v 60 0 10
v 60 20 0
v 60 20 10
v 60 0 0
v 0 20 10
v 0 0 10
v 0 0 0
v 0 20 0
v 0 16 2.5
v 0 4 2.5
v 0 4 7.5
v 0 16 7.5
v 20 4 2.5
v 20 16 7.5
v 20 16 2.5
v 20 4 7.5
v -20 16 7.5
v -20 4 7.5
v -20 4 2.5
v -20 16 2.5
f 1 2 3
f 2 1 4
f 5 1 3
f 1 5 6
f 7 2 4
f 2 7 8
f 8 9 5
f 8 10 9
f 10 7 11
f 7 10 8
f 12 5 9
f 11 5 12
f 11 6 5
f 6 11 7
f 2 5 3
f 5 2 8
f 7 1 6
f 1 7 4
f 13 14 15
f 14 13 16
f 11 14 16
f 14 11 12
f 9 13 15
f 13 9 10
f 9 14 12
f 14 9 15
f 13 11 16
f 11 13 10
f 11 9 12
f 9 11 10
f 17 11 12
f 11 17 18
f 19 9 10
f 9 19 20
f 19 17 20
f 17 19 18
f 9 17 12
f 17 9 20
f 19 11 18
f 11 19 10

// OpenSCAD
// Parameters for the USB Disk
length = 60; // Length of the USB Disk
width = 20;  // Width of the USB Disk
height = 10; // Height of the USB Disk

// Parameters for the USB Connector
conn_length = 20; // Length of the Connector
conn_width = 12;  // Width of the Connector
conn_height = 5;  // Height of the Connector

module usb_disk() {
    difference() {
        // Body of the USB Disk
        cube([length, width, height]);

        // Hollow space for the USB Connector
        translate([0, (width - conn_width)/2, (height - conn_height)/2])
        cube([conn_length, conn_width, conn_height]);
    }
}

module usb_connector() {
    // USB Connector part
    translate([- conn_length, (width - conn_width)/2, (height - conn_height)/2])
    cube([conn_length, conn_width, conn_height]);
}

// Combine the USB disk body and the connector
usb_disk();
usb_connector();
